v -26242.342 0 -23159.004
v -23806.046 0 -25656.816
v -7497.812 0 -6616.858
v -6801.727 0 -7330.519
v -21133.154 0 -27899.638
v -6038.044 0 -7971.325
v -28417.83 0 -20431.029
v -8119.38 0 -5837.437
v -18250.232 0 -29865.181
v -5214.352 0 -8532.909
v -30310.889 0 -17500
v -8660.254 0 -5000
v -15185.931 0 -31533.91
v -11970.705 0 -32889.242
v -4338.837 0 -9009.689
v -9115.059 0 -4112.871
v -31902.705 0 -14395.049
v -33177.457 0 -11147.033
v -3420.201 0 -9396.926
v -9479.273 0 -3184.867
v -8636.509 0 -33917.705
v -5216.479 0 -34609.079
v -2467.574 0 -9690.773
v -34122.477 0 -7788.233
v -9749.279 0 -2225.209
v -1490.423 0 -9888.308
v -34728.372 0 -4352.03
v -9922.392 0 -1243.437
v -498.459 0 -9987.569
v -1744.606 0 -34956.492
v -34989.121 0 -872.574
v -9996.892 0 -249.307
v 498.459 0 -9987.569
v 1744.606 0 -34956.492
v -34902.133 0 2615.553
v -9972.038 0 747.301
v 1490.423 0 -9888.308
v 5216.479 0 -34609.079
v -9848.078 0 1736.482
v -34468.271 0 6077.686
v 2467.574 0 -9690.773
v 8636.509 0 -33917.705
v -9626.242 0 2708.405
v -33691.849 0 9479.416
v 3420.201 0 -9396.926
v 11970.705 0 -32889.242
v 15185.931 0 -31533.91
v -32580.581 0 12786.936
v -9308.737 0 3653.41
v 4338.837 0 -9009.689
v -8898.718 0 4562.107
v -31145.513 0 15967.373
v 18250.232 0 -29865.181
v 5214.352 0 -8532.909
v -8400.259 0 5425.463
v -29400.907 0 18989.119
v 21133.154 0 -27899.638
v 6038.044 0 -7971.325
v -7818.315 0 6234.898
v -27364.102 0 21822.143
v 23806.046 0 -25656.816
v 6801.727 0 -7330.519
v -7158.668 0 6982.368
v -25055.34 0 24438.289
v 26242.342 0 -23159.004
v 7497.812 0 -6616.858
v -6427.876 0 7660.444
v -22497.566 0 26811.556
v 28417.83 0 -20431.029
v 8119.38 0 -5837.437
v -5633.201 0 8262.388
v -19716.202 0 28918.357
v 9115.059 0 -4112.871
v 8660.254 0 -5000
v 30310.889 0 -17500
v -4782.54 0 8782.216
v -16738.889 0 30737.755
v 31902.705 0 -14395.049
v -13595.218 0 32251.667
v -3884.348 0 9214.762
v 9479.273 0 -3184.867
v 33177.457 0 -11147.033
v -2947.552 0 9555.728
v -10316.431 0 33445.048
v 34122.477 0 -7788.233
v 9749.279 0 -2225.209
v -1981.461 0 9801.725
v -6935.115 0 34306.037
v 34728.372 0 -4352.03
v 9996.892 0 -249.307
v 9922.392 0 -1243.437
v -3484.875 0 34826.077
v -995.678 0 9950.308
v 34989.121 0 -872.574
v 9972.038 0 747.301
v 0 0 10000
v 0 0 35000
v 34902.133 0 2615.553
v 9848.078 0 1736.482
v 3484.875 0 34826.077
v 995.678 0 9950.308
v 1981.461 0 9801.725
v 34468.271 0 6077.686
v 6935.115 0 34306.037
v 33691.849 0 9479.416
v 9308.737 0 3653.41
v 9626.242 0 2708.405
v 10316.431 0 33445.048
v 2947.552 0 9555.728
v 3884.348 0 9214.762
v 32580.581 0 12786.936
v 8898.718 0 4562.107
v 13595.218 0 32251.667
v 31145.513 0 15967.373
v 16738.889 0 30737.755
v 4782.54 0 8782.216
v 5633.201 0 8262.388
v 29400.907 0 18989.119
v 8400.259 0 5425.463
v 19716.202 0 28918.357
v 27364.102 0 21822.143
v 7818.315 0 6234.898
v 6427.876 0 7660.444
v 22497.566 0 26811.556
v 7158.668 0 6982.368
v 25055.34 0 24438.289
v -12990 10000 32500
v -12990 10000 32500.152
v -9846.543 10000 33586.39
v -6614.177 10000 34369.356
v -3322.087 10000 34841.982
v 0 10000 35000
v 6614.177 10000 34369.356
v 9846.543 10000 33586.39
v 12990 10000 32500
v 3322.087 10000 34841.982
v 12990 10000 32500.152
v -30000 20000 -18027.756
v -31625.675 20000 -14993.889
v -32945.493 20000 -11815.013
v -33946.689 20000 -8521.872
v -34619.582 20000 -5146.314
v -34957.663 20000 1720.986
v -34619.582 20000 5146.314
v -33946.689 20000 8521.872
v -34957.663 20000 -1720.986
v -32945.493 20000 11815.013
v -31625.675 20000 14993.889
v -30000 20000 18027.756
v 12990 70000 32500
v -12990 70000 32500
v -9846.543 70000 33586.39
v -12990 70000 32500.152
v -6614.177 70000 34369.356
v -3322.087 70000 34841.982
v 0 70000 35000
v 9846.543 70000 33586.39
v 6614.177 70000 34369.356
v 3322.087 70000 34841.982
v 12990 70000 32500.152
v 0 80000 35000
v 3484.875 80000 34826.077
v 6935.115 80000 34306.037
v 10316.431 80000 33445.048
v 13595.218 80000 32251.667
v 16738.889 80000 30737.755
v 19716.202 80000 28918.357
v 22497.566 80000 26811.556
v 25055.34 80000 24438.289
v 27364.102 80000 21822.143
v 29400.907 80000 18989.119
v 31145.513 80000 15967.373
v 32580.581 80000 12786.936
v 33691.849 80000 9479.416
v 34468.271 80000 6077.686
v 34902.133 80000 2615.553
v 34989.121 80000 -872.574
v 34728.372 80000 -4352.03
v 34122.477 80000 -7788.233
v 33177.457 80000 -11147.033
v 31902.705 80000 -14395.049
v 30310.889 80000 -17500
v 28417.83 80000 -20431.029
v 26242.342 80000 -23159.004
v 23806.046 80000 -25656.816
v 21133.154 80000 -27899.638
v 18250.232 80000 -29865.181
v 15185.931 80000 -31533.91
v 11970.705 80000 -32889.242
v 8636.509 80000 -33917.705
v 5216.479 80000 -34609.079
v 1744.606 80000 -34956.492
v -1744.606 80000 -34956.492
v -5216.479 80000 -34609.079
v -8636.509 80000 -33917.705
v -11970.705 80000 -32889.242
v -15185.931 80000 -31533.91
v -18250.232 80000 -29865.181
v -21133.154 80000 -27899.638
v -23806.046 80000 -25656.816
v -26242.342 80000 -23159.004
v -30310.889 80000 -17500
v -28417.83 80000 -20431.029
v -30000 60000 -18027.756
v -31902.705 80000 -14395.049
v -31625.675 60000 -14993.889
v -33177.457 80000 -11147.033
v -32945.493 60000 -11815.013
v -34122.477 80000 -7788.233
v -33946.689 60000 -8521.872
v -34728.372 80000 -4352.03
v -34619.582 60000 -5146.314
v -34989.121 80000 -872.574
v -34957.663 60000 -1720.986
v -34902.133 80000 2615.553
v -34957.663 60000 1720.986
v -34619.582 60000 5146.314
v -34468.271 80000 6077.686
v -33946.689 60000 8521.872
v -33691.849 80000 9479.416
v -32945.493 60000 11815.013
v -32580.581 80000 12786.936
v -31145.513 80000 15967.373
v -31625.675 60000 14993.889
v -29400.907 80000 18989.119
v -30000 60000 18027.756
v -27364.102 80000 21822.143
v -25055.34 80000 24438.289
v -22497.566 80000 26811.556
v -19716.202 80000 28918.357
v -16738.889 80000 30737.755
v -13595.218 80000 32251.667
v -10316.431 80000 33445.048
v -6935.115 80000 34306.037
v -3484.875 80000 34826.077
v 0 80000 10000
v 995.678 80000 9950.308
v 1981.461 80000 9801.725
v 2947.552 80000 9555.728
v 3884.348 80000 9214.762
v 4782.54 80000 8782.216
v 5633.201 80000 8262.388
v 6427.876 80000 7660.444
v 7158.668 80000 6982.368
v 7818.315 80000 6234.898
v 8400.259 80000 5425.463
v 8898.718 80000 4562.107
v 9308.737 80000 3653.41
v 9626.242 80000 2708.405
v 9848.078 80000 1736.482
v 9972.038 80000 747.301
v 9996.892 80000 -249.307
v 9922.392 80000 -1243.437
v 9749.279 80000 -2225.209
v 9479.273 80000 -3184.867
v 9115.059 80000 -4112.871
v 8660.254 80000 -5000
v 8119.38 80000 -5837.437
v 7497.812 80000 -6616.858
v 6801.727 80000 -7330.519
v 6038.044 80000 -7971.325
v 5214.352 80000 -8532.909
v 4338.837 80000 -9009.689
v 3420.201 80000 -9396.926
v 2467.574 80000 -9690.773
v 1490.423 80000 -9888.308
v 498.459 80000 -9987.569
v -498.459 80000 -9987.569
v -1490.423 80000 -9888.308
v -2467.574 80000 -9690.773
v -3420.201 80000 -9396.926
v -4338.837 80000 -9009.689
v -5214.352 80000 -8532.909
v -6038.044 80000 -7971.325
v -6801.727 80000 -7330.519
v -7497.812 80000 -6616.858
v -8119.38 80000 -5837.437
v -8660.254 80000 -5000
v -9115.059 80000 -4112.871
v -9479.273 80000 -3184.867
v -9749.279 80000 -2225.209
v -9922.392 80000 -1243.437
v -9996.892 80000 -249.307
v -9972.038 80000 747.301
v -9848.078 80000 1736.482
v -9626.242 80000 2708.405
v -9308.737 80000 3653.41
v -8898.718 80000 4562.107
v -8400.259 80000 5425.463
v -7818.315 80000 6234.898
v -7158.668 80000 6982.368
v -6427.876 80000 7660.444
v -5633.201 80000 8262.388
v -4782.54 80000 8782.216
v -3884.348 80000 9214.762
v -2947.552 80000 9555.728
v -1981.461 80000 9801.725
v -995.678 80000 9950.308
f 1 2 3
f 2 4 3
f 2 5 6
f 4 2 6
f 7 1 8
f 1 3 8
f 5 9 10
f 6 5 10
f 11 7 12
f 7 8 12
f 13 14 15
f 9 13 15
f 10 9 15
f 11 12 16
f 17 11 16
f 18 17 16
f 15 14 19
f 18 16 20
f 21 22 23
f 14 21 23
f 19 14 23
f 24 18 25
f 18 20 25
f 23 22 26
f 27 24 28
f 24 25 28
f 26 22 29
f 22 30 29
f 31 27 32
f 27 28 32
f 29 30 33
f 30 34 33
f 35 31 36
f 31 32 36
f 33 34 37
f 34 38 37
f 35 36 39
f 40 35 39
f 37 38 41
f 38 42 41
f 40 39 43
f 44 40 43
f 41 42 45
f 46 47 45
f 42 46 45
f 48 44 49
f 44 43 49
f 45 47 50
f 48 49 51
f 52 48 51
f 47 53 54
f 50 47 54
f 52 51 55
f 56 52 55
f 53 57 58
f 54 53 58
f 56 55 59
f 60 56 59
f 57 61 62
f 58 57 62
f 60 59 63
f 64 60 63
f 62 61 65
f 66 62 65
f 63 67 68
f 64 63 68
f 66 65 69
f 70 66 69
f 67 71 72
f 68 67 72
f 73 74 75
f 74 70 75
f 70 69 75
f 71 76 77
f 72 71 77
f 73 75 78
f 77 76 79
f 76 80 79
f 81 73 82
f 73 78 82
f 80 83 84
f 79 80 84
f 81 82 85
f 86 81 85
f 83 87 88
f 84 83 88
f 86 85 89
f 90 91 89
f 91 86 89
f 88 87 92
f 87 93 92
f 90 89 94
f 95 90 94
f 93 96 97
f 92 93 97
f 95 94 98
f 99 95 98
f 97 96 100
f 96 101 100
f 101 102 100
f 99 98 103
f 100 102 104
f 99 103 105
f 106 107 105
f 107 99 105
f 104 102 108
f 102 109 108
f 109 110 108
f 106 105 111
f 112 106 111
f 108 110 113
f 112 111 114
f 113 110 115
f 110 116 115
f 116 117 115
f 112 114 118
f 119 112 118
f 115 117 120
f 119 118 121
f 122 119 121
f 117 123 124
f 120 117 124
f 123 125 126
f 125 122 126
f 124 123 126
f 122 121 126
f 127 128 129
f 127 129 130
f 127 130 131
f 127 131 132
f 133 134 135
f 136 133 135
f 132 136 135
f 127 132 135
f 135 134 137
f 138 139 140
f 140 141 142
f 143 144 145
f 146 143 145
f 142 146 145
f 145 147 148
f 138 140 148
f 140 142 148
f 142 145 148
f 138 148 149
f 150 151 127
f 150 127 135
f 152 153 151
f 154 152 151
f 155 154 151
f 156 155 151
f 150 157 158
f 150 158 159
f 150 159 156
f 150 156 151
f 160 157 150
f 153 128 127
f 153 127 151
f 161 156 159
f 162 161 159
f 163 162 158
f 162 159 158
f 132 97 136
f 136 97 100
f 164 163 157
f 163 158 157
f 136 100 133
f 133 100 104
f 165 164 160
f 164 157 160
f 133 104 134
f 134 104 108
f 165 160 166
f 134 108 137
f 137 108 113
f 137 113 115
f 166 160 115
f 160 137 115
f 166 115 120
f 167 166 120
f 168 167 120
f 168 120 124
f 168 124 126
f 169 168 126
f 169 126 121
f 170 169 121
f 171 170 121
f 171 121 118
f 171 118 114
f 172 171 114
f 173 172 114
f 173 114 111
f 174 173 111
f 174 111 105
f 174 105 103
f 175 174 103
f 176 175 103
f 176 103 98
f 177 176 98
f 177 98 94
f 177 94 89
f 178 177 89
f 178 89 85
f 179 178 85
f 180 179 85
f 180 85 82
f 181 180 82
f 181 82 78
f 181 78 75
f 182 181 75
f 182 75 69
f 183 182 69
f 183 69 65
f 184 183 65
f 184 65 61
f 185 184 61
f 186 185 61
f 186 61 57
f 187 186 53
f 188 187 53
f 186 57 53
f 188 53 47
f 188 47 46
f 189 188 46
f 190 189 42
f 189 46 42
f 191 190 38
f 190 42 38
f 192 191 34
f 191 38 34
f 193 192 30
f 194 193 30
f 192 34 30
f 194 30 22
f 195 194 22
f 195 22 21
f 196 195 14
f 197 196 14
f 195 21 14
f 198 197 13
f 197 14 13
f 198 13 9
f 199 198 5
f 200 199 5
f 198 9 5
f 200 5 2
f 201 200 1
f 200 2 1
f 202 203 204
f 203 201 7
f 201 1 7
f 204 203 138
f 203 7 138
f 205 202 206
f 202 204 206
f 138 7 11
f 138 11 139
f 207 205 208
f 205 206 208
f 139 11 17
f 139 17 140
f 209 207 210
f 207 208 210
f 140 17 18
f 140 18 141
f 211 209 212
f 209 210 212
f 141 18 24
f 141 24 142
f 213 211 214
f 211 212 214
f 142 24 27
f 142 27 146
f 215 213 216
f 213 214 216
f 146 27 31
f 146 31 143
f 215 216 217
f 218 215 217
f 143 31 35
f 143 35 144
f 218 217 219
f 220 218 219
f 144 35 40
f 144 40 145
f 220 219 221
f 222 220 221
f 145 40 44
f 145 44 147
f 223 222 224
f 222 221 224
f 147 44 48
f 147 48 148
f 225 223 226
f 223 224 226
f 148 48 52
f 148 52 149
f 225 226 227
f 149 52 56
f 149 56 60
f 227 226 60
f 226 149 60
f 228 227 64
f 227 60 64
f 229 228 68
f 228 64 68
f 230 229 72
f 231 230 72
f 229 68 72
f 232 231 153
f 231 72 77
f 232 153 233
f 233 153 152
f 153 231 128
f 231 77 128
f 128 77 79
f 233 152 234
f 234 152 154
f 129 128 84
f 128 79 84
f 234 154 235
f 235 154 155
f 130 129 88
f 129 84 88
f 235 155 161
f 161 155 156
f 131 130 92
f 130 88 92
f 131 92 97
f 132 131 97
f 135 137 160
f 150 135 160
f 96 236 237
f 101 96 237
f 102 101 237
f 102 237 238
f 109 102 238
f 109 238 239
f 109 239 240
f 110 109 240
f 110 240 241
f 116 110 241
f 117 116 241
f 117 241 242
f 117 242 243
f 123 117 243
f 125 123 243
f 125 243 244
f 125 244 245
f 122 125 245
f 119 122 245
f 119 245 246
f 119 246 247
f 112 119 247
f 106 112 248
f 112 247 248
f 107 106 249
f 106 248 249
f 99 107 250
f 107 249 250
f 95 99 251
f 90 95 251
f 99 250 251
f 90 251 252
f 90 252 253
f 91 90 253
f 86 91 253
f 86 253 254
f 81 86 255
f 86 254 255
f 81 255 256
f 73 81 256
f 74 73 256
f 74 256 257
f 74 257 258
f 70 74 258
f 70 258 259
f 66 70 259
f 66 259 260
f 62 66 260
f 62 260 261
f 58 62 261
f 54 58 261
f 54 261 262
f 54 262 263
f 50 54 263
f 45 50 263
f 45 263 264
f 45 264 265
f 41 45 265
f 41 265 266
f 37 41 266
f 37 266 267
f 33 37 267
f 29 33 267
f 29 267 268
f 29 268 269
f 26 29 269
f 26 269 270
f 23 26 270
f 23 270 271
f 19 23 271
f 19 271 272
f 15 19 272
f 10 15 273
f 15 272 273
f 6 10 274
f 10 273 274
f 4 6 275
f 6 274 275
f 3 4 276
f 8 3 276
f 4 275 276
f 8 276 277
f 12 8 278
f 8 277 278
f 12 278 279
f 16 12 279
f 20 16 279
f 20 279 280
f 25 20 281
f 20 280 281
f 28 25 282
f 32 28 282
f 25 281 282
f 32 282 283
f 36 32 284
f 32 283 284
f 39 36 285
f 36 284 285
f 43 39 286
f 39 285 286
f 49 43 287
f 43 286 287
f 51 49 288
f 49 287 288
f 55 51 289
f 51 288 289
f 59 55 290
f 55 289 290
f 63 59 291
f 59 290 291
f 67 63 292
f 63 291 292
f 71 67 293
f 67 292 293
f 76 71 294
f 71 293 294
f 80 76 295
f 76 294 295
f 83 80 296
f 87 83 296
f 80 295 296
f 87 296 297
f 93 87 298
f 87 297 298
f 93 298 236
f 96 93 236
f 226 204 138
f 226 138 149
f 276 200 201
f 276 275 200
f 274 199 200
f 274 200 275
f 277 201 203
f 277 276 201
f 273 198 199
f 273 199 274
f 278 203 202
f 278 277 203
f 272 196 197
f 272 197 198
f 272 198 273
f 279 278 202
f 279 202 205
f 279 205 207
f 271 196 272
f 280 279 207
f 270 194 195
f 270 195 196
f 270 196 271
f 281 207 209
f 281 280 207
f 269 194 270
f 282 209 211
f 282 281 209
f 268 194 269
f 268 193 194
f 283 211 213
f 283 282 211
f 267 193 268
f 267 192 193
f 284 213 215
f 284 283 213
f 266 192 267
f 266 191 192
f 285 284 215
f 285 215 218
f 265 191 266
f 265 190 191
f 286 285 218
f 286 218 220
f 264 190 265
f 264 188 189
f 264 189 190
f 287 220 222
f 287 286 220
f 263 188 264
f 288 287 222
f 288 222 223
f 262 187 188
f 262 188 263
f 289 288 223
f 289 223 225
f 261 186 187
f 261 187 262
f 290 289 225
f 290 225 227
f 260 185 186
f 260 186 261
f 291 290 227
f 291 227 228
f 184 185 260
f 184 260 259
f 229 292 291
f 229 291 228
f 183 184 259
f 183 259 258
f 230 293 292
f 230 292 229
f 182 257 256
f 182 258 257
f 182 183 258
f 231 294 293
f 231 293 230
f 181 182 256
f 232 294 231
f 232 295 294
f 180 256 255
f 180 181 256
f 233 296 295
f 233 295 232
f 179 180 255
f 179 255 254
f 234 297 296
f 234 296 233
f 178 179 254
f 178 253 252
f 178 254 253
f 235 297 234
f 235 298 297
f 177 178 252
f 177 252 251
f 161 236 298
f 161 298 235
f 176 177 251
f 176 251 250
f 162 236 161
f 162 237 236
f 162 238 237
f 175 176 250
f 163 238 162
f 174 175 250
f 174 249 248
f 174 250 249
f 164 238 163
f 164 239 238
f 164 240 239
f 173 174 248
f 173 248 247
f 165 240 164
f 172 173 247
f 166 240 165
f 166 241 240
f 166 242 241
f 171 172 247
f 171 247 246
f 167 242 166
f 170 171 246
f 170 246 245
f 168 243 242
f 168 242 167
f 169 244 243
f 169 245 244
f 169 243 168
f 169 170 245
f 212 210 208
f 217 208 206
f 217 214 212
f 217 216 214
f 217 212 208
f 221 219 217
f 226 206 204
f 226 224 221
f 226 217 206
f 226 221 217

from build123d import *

# Parameters (mm, degrees)
SKETCH1_R           = 35000
BOSS_EXTRUDE1_DEPTH = 80000
SKETCH2_R           = 10000
CUT_EXTRUDE1_DEPTH  = 94075.438611134
SKETCH3_W           = 25980
SKETCH3_H           = 60000
CUT_EXTRUDE2_DEPTH  = 2500
SKETCH4_W           = 36060
SKETCH4_H           = 40000
CUT_EXTRUDE3_DEPTH  = 5000


with BuildPart() as part:
    # Sketch1 → Boss-Extrude1 (new body)
    with BuildSketch(Plane(origin=(0, 0, 0), x_dir=(1, 0, 0), z_dir=(0, 1, 0))):
        Circle(SKETCH1_R)
    extrude(amount=BOSS_EXTRUDE1_DEPTH)

    # Sketch2 → Cut-Extrude1 (cut, through all)
    with BuildSketch(Plane(origin=(0, 80000, 0), x_dir=(1, 0, 0), z_dir=(0, 1, 0))):
        Circle(SKETCH2_R)
    extrude(amount=-CUT_EXTRUDE1_DEPTH, mode=Mode.SUBTRACT)

    # Sketch3 → Cut-Extrude2 (cut)
    with BuildSketch(Plane.XY.offset(35000)):
        with Locations((0, 40000)):
            Rectangle(SKETCH3_W, SKETCH3_H)
    extrude(amount=-CUT_EXTRUDE2_DEPTH, mode=Mode.SUBTRACT)

    # Sketch4 → Cut-Extrude3 (cut)
    with BuildSketch(Plane.ZY.offset(35000)):
        with Locations((0, 40000)):
            Rectangle(SKETCH4_W, SKETCH4_H)
    extrude(amount=-CUT_EXTRUDE3_DEPTH, mode=Mode.SUBTRACT)


solid = part.part
